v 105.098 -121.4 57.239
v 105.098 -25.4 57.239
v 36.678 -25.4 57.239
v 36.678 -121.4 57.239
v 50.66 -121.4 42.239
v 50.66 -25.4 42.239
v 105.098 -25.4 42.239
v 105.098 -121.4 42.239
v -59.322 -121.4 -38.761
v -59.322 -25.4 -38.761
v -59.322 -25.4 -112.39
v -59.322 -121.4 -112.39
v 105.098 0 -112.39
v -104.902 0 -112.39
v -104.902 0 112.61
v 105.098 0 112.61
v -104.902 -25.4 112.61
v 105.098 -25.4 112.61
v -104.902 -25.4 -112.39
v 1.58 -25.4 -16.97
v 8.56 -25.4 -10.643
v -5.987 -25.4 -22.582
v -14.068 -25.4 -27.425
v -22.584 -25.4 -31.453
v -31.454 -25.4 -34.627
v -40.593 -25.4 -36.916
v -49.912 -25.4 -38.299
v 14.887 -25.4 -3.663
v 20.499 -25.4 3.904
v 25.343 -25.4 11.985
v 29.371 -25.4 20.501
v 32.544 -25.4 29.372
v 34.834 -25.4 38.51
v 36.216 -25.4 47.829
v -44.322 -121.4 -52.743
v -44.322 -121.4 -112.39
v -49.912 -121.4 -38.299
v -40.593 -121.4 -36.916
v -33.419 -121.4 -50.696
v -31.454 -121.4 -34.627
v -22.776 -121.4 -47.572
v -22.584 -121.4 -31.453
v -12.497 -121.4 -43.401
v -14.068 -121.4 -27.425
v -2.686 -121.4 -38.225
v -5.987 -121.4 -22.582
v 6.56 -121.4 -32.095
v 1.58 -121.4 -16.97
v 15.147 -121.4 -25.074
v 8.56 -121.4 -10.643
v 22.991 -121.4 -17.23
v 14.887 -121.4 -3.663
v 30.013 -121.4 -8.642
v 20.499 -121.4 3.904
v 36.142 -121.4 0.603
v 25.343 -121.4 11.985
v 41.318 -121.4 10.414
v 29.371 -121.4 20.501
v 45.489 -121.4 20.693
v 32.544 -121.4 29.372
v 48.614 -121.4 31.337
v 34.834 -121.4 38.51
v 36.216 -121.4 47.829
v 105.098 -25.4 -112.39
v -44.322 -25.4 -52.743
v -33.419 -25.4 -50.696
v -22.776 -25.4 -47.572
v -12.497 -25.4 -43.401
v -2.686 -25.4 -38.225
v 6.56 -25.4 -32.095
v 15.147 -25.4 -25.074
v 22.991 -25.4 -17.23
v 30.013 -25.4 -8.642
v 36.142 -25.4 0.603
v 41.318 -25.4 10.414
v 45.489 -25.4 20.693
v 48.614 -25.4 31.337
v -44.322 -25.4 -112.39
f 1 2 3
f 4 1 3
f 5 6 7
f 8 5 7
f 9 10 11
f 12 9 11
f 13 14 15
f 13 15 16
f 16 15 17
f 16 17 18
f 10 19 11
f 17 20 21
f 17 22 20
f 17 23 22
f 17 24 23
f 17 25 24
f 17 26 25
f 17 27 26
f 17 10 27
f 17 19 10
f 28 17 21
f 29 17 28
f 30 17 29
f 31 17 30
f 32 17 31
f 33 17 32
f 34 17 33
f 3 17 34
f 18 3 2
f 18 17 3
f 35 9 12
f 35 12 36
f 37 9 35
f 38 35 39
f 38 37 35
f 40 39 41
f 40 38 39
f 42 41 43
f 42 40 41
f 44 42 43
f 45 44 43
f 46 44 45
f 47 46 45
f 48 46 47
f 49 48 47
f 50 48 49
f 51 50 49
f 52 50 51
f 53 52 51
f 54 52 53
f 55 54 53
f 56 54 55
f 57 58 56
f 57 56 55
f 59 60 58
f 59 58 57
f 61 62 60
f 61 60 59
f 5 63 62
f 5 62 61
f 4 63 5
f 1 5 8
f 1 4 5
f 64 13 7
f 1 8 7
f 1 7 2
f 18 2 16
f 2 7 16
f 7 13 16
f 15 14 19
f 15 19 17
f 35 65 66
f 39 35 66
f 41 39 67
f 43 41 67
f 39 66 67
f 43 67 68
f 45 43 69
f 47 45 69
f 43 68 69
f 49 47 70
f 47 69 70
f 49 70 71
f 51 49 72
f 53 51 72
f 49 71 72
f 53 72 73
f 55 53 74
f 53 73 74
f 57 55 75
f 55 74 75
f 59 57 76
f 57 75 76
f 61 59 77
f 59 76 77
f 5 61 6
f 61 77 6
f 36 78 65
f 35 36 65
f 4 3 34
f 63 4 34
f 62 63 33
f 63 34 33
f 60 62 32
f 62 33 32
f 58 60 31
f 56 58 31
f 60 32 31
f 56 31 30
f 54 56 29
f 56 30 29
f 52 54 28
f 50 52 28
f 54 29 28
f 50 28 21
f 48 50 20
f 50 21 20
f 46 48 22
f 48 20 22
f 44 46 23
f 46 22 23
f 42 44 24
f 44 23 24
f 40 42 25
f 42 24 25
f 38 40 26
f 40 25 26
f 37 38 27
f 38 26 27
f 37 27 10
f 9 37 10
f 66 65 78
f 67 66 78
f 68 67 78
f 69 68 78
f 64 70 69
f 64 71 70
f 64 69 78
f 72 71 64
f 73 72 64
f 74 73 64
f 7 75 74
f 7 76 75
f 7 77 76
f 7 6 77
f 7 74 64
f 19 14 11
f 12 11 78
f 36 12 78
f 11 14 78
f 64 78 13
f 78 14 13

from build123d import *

# Parameters (mm, degrees)
F0_W     = 210
F0_H     = 225
F1_DEPTH = 25.4
F4_DEPTH = 96


with BuildPart() as f1:
    # F0 (on Front) → F1 (new body)
    with BuildSketch(Plane.XZ):
        with Locations((-25.301798, 8.873123)):
            Rectangle(F0_W, F0_H)
    extrude(amount=F1_DEPTH)


with BuildPart() as f1_1:
    # F2: moved
    add(f1.part.moved(Location((25.4, 0, -8.763))))

    # F3 (on face) → F4 (join)
    with BuildSketch(Plane.XZ.offset(25.4)):
        with BuildLine():
            Line((-59.321807, -38.761023), (-59.321807, -112.389877))
            Line((-59.321807, -112.389877), (-44.321807, -112.389877))
            Line((-44.321807, -112.389877), (-44.321807, -52.74284))
            ThreePointArc((-44.321807, -52.74284), (19.167046, -21.249876), (50.66001, 42.238977))
            Line((50.66001, 42.238977), (105.098202, 42.238977))
            Line((105.098202, 42.238977), (105.098202, 57.238977))
            Line((105.098202, 57.238977), (36.678193, 57.238977))
            ThreePointArc((36.678193, 57.238977), (8.560444, -10.643274), (-59.321807, -38.761023))
        make_face()
    extrude(amount=F4_DEPTH)


solid = f1_1.part
